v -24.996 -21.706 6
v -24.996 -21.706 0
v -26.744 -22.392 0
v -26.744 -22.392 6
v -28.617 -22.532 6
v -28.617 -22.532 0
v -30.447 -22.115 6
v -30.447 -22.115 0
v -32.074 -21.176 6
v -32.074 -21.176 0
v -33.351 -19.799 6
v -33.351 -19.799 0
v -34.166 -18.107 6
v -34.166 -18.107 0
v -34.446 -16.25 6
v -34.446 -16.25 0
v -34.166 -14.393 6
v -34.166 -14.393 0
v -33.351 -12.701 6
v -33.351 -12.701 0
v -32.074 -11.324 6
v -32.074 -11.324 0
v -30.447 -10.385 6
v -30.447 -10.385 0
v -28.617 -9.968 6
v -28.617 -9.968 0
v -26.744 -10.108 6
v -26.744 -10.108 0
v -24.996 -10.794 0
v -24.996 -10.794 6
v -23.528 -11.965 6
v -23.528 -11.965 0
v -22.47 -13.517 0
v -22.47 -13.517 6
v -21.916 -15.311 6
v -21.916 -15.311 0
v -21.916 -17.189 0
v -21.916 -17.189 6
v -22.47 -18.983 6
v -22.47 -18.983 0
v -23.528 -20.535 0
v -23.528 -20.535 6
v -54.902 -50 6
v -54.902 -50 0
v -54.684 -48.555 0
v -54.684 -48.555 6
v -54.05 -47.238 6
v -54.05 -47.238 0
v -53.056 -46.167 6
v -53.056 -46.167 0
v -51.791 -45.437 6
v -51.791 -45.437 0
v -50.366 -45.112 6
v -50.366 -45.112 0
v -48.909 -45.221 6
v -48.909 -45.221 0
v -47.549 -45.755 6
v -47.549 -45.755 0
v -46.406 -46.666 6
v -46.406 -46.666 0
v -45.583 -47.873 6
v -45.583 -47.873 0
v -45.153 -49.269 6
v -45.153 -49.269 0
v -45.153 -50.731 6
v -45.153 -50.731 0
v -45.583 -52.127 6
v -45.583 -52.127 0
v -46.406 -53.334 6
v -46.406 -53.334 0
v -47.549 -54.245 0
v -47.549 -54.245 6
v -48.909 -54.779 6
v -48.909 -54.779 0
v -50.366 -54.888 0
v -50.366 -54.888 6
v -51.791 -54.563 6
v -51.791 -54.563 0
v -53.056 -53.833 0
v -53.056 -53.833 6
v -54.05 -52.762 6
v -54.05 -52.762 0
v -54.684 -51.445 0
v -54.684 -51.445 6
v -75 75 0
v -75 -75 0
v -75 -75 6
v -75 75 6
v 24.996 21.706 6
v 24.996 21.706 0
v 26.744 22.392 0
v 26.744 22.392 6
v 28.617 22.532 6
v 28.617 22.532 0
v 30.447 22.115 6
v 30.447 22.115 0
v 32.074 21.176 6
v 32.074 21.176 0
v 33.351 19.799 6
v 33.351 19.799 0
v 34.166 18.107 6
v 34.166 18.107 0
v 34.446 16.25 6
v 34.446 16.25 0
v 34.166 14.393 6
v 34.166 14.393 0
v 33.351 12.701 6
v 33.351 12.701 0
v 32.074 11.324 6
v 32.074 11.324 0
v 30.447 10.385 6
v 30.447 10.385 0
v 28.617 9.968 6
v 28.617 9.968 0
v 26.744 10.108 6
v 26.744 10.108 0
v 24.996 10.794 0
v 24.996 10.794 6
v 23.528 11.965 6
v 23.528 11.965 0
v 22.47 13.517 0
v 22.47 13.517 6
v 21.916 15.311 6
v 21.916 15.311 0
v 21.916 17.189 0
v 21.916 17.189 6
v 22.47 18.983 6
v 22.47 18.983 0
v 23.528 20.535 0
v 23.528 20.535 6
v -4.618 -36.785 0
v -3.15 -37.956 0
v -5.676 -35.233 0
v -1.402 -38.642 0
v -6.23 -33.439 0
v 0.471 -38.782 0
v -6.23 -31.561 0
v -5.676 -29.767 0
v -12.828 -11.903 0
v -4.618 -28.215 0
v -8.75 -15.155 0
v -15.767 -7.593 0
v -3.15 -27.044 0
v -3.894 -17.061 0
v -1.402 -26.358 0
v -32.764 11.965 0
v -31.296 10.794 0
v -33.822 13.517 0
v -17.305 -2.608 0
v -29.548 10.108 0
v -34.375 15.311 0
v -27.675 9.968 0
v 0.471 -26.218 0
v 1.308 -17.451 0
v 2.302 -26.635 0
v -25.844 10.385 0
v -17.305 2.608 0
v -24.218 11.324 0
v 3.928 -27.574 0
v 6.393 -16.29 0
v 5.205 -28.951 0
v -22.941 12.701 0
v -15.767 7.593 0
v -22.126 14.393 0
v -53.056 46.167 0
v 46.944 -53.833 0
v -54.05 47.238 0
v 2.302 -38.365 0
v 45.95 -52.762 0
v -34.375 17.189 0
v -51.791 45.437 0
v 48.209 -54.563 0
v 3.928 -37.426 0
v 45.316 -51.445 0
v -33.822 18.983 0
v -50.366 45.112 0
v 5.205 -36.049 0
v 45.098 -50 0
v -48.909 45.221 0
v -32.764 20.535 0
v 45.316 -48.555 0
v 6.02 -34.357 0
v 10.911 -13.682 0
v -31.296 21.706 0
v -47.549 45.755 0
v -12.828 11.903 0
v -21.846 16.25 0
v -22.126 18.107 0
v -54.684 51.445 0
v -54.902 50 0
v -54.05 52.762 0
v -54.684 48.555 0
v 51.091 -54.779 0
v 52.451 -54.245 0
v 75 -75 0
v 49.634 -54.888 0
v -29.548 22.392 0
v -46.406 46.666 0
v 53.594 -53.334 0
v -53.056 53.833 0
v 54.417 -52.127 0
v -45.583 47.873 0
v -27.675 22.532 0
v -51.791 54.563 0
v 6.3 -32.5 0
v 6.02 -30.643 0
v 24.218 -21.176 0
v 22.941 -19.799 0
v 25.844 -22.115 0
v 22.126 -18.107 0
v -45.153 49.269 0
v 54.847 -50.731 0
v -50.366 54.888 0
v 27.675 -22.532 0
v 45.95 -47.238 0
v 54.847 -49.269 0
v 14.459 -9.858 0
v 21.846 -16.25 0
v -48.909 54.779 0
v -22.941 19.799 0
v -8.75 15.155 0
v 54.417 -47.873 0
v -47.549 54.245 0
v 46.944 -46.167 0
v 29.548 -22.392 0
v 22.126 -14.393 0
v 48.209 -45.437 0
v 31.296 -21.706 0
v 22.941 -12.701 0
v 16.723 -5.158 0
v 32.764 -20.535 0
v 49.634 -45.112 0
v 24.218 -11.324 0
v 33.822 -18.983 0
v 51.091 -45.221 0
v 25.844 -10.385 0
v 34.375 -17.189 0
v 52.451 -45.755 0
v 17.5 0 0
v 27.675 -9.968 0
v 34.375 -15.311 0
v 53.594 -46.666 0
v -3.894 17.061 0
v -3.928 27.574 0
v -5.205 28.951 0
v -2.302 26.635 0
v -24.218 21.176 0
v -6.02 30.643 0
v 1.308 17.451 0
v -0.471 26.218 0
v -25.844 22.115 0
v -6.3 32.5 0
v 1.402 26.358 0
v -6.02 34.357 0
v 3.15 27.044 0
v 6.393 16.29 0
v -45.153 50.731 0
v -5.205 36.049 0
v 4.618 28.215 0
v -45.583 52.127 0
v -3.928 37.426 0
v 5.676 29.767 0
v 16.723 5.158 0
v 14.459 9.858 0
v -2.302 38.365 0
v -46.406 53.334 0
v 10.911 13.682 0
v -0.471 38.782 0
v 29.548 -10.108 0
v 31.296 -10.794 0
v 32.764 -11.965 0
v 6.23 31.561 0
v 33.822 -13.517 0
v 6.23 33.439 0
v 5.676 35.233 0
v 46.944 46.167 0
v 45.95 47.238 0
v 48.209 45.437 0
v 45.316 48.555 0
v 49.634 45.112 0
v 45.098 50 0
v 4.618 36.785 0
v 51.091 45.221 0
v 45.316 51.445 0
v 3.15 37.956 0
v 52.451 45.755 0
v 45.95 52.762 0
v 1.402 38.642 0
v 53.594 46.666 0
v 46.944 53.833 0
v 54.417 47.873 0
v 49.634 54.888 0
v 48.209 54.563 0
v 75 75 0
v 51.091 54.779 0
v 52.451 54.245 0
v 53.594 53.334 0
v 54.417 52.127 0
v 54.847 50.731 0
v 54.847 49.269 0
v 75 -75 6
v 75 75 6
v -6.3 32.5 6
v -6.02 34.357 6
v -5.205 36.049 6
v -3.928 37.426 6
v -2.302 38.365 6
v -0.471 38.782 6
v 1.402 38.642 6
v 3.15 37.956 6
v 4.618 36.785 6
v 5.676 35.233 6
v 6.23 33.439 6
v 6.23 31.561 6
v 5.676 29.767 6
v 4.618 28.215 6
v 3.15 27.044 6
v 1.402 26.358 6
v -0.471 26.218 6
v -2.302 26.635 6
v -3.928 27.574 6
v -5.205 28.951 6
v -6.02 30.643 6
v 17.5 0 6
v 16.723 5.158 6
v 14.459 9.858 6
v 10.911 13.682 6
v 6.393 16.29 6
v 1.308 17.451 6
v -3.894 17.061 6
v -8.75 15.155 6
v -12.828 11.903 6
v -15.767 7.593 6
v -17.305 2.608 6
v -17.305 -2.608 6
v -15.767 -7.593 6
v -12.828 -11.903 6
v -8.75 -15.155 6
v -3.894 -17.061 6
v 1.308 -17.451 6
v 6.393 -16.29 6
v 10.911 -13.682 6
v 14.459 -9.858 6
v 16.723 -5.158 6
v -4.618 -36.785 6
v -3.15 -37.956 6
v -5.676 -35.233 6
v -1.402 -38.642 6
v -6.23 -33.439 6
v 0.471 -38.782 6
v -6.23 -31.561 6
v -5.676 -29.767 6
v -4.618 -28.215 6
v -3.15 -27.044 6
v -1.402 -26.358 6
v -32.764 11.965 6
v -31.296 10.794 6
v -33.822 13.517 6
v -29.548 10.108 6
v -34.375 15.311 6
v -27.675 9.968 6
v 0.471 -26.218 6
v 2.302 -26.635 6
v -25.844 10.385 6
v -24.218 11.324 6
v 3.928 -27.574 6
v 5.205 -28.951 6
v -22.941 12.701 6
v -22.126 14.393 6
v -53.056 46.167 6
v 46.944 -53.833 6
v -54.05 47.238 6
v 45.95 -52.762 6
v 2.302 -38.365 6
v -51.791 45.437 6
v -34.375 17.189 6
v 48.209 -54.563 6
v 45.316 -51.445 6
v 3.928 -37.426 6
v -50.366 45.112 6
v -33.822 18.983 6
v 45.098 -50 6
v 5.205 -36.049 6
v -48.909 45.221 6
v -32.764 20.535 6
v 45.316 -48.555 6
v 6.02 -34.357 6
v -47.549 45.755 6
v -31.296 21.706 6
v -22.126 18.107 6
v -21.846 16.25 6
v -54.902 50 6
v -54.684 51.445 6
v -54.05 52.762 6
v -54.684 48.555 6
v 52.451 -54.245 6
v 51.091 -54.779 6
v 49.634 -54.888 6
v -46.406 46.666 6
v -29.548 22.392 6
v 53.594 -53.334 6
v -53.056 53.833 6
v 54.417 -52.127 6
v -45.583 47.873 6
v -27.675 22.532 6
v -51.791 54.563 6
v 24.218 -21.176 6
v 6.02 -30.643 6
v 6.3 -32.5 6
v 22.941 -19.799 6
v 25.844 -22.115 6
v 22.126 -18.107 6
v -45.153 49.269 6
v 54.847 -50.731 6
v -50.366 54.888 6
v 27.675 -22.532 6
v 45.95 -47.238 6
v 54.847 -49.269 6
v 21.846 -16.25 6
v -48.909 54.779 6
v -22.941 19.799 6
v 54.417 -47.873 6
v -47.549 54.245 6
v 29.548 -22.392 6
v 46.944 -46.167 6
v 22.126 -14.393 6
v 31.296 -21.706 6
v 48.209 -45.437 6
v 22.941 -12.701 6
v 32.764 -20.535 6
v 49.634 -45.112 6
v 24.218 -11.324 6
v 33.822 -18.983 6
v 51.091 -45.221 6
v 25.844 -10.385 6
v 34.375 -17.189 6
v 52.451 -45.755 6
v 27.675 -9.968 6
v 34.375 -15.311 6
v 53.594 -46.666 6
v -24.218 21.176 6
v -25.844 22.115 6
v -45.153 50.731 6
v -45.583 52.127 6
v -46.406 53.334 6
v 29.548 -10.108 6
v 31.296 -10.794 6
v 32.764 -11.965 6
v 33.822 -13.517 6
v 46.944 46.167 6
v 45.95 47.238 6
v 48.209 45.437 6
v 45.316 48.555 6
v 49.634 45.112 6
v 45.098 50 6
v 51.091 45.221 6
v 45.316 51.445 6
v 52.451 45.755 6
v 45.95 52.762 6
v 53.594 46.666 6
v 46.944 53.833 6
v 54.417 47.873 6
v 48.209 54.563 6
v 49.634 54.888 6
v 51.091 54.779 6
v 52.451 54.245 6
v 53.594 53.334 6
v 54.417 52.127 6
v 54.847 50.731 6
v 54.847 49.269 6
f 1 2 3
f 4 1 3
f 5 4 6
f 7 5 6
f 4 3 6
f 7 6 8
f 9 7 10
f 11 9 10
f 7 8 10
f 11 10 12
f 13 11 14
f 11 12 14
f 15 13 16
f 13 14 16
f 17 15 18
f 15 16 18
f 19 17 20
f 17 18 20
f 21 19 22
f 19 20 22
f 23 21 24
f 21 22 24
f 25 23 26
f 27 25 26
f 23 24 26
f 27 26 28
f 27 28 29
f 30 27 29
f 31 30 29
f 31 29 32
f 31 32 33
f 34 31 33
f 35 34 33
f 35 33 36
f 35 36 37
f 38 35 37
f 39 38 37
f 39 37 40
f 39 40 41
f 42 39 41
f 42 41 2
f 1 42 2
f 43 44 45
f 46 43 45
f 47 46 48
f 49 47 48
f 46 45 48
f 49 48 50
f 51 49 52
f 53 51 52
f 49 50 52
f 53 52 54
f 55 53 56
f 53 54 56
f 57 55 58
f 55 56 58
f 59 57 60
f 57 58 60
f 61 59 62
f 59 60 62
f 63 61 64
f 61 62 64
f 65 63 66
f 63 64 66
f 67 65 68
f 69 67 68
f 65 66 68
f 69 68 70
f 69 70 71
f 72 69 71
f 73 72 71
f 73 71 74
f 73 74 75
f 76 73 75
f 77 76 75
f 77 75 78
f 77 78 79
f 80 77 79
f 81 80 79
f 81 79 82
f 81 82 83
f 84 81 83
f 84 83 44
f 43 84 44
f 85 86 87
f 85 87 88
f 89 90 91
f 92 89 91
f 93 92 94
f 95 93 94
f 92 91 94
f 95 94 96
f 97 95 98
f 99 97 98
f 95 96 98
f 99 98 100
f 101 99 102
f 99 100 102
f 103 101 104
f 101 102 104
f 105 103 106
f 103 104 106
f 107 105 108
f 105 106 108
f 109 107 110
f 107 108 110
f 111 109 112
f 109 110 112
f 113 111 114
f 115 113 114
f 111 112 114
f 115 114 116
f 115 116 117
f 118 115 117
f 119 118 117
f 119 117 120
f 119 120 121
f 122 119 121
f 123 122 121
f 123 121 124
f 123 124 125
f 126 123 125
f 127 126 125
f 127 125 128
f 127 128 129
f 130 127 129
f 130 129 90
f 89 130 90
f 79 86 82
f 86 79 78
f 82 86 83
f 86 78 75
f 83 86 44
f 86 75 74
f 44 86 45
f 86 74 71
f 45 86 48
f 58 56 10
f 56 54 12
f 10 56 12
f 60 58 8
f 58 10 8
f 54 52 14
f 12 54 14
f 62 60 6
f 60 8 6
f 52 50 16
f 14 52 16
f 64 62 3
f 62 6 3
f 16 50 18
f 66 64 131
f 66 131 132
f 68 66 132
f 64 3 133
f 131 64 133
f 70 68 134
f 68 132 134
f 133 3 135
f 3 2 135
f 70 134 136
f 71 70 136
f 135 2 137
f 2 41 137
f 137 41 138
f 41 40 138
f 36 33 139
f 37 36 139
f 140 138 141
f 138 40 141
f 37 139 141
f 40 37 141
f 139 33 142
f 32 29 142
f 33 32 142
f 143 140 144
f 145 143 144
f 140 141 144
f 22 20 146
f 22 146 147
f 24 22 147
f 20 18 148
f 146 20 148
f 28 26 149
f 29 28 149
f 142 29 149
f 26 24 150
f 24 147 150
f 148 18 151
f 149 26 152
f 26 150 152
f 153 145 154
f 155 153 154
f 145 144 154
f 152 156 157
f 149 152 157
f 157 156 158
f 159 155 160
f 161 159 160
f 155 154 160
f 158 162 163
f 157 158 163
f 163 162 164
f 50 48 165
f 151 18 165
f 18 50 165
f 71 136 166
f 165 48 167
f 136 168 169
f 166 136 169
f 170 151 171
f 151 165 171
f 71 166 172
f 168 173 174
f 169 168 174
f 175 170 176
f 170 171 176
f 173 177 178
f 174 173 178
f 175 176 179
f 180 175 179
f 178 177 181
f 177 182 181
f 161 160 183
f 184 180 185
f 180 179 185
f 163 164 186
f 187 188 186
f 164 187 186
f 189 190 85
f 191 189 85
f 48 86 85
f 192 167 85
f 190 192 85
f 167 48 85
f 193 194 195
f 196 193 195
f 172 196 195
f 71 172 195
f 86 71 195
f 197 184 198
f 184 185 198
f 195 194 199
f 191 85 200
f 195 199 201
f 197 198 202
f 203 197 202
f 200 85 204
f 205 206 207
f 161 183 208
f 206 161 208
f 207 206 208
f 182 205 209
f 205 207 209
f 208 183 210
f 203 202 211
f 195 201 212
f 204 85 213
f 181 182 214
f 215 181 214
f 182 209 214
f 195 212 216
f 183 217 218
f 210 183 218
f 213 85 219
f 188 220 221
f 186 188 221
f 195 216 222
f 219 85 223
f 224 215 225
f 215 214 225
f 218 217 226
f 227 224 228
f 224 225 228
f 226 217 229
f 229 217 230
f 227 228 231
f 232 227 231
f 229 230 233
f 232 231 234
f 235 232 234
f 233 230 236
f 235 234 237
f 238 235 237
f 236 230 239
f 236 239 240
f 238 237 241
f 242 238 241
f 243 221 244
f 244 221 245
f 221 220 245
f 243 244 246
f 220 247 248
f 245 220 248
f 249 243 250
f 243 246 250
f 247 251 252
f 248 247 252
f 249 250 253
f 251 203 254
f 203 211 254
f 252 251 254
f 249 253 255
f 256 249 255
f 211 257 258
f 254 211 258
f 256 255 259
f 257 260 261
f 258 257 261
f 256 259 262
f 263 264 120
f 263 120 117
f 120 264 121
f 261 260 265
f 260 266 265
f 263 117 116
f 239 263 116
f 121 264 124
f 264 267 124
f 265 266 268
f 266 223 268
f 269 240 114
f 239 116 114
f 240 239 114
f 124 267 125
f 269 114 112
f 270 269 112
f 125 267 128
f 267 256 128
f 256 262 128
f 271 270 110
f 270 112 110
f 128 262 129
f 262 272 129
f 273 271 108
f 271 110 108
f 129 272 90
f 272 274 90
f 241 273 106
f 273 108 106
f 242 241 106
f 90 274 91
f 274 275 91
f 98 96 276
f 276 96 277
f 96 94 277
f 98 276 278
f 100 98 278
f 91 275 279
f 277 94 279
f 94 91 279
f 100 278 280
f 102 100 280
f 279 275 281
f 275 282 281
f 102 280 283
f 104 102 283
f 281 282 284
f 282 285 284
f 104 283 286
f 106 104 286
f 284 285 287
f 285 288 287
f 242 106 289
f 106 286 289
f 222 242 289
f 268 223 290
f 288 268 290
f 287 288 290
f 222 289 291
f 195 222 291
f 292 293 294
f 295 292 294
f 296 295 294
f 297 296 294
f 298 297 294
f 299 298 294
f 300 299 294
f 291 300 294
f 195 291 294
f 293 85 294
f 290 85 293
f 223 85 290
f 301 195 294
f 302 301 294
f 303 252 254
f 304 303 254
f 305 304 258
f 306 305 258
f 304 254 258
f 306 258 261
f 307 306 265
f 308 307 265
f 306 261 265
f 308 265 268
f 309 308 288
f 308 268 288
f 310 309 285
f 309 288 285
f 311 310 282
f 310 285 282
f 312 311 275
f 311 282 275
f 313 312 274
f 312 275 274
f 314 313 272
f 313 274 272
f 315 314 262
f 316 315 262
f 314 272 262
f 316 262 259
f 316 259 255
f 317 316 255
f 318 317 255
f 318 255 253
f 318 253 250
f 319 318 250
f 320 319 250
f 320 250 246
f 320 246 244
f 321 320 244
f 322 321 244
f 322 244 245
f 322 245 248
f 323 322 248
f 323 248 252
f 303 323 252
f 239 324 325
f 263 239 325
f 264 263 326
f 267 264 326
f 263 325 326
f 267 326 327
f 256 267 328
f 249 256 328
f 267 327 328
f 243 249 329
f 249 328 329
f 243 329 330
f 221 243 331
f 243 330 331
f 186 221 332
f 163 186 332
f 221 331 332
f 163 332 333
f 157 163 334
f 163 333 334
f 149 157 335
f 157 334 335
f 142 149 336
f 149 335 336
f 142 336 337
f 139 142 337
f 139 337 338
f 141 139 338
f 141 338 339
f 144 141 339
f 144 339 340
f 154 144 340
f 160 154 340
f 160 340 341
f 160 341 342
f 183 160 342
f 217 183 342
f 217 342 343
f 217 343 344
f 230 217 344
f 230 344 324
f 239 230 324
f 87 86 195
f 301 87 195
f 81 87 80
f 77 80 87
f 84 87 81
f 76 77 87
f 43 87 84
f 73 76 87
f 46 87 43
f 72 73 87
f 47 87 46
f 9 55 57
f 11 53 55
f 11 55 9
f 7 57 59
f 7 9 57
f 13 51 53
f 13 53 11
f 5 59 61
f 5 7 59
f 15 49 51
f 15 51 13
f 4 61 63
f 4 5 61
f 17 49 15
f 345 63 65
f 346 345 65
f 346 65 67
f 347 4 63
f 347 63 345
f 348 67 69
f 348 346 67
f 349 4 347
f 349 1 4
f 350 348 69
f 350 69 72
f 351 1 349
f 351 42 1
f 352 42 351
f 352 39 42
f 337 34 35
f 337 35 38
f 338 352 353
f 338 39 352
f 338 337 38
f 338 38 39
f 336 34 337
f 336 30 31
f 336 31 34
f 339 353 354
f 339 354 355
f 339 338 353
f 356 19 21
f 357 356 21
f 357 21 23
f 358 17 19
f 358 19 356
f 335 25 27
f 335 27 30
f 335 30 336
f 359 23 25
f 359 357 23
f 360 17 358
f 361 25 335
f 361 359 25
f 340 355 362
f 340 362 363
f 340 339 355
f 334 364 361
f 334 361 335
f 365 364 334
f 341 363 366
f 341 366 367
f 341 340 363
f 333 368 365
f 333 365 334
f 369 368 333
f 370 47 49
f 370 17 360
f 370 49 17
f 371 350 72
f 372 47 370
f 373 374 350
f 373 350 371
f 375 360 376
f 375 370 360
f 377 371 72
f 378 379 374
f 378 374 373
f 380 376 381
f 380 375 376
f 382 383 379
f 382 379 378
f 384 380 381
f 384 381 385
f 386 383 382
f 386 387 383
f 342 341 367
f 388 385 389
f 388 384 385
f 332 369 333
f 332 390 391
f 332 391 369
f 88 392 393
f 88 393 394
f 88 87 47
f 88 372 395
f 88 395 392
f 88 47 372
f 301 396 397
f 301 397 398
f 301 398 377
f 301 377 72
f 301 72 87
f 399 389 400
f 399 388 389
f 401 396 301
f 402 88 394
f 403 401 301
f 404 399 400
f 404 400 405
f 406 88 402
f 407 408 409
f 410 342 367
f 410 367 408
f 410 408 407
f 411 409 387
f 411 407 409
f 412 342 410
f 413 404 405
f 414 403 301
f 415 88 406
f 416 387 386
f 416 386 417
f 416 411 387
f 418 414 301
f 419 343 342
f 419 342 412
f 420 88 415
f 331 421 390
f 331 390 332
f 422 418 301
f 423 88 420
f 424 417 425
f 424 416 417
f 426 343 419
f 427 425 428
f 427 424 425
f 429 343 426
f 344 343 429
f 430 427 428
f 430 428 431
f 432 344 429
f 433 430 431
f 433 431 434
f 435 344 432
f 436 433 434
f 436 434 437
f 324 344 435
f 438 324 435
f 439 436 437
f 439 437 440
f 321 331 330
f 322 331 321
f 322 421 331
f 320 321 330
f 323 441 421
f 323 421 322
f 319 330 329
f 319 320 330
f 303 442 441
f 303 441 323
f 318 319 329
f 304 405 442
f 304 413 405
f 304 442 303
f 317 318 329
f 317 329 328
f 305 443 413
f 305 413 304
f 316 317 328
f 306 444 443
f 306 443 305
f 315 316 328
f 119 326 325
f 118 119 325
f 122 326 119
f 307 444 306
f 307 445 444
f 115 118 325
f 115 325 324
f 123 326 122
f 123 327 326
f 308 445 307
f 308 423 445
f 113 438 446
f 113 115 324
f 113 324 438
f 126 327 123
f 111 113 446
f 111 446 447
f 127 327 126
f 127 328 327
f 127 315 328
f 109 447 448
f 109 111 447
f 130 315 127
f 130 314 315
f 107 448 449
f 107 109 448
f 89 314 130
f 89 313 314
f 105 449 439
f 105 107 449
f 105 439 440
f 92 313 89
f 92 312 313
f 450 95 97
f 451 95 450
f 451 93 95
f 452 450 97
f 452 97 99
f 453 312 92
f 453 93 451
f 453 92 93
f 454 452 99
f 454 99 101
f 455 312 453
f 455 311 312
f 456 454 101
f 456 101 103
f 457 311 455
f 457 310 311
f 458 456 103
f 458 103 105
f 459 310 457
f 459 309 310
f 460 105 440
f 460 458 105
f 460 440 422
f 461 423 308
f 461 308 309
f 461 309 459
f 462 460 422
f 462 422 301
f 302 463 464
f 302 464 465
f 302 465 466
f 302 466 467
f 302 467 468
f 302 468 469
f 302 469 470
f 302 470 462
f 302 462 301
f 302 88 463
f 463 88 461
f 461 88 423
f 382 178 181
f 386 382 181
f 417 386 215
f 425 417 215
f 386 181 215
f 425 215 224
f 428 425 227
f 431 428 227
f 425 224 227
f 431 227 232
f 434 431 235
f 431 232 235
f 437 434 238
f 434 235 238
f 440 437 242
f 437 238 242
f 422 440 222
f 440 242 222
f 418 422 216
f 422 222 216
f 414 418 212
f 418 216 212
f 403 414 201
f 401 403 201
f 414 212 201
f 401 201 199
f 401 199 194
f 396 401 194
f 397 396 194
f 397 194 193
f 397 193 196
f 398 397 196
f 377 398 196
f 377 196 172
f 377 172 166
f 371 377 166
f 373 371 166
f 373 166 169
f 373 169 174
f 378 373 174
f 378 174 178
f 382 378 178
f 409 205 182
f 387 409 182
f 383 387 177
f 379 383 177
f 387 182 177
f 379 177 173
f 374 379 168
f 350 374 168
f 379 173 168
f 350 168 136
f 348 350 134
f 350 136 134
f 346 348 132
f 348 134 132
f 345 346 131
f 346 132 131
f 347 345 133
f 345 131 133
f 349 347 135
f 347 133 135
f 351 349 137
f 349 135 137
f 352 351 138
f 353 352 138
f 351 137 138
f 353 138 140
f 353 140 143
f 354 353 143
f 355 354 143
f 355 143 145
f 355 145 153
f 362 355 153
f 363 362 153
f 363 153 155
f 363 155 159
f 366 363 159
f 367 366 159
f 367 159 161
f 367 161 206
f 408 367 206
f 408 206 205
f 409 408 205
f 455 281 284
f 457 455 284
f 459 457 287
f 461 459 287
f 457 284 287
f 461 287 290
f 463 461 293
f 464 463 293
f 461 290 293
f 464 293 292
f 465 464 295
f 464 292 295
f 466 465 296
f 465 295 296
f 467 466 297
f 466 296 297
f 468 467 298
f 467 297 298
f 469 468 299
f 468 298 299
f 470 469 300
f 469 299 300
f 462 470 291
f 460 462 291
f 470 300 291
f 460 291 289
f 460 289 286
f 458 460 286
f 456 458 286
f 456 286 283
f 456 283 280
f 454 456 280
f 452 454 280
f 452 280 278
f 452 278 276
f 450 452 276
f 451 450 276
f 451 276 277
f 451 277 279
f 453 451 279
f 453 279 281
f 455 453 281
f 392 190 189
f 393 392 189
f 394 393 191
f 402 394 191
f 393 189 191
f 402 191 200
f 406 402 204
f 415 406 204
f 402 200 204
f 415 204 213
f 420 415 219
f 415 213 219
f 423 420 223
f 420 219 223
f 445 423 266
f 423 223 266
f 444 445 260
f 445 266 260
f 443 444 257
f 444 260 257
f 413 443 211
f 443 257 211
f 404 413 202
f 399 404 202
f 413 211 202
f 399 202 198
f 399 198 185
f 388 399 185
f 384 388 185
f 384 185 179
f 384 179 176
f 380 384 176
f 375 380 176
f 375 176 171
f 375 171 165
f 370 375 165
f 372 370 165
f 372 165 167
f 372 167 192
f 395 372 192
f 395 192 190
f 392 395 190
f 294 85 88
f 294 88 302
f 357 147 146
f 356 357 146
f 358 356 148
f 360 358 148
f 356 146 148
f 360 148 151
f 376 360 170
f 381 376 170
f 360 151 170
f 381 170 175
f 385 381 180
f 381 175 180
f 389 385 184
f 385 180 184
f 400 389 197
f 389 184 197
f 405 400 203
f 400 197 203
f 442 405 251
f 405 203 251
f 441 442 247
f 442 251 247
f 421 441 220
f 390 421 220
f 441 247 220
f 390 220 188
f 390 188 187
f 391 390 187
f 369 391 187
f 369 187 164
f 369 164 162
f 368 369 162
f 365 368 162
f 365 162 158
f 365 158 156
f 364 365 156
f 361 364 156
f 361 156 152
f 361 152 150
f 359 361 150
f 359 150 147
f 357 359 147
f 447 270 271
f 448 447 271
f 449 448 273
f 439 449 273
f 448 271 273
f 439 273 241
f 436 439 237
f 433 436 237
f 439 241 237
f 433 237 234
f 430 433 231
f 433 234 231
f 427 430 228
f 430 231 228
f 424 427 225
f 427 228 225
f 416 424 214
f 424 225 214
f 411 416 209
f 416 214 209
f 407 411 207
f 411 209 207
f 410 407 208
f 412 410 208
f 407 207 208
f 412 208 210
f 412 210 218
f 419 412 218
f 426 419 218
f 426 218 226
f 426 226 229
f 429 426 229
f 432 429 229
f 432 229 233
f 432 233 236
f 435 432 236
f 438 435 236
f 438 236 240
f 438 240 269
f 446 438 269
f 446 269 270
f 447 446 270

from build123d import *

# Parameters (mm, degrees)
F0_R            = 41.5
F1_DEPTH        = 6
F2_W            = 150
F2_H            = 150
F3_DEPTH        = 6
F5_R            = 17.5
F6_DEPTH        = 6.001
F7_D            = 12.6
F7_COPIES_COUNT = 6
F9_D            = 9.8044


# Not quite as in the source:
# - a pattern or mirror of a feature is missing from the dataset's text; its kind, count and spacing are read off the source's solid


with BuildPart() as f1:
    # F0 (on Top) → F1 (new body)
    with BuildSketch(Plane.XY):
        Circle(F0_R)
    extrude(amount=F1_DEPTH)

    # F2 (on Top) → F3 (join)
    with BuildSketch(Plane.XY):
        Rectangle(F2_W, F2_H)
    extrude(amount=F3_DEPTH)

    # F5 (on face) → F6 (cut, through all)
    with BuildSketch(Plane.XY.offset(6)):
        Circle(F5_R)
    extrude(amount=-F6_DEPTH, mode=Mode.SUBTRACT)

    # F7 (through all)
    with Locations(Plane.XY.offset(6)):
        with Locations((0, 32.5)):
            f7 = Hole(F7_D / 2)

    # F7_copies: F7 ×6 about axis
    f7_copies_axis = Axis((0, 0, 0), (0, 0, 1))
    for i in range(1, F7_COPIES_COUNT):
        add(f7.rotate(f7_copies_axis, i * 360 / F7_COPIES_COUNT), mode=Mode.SUBTRACT)

    # F9 (through all)
    with Locations(Plane.XY.offset(6)):
        with Locations((-50, 50), (50, 50), (50, -50), (-50, -50)):
            Hole(F9_D / 2)


solid = f1.part
